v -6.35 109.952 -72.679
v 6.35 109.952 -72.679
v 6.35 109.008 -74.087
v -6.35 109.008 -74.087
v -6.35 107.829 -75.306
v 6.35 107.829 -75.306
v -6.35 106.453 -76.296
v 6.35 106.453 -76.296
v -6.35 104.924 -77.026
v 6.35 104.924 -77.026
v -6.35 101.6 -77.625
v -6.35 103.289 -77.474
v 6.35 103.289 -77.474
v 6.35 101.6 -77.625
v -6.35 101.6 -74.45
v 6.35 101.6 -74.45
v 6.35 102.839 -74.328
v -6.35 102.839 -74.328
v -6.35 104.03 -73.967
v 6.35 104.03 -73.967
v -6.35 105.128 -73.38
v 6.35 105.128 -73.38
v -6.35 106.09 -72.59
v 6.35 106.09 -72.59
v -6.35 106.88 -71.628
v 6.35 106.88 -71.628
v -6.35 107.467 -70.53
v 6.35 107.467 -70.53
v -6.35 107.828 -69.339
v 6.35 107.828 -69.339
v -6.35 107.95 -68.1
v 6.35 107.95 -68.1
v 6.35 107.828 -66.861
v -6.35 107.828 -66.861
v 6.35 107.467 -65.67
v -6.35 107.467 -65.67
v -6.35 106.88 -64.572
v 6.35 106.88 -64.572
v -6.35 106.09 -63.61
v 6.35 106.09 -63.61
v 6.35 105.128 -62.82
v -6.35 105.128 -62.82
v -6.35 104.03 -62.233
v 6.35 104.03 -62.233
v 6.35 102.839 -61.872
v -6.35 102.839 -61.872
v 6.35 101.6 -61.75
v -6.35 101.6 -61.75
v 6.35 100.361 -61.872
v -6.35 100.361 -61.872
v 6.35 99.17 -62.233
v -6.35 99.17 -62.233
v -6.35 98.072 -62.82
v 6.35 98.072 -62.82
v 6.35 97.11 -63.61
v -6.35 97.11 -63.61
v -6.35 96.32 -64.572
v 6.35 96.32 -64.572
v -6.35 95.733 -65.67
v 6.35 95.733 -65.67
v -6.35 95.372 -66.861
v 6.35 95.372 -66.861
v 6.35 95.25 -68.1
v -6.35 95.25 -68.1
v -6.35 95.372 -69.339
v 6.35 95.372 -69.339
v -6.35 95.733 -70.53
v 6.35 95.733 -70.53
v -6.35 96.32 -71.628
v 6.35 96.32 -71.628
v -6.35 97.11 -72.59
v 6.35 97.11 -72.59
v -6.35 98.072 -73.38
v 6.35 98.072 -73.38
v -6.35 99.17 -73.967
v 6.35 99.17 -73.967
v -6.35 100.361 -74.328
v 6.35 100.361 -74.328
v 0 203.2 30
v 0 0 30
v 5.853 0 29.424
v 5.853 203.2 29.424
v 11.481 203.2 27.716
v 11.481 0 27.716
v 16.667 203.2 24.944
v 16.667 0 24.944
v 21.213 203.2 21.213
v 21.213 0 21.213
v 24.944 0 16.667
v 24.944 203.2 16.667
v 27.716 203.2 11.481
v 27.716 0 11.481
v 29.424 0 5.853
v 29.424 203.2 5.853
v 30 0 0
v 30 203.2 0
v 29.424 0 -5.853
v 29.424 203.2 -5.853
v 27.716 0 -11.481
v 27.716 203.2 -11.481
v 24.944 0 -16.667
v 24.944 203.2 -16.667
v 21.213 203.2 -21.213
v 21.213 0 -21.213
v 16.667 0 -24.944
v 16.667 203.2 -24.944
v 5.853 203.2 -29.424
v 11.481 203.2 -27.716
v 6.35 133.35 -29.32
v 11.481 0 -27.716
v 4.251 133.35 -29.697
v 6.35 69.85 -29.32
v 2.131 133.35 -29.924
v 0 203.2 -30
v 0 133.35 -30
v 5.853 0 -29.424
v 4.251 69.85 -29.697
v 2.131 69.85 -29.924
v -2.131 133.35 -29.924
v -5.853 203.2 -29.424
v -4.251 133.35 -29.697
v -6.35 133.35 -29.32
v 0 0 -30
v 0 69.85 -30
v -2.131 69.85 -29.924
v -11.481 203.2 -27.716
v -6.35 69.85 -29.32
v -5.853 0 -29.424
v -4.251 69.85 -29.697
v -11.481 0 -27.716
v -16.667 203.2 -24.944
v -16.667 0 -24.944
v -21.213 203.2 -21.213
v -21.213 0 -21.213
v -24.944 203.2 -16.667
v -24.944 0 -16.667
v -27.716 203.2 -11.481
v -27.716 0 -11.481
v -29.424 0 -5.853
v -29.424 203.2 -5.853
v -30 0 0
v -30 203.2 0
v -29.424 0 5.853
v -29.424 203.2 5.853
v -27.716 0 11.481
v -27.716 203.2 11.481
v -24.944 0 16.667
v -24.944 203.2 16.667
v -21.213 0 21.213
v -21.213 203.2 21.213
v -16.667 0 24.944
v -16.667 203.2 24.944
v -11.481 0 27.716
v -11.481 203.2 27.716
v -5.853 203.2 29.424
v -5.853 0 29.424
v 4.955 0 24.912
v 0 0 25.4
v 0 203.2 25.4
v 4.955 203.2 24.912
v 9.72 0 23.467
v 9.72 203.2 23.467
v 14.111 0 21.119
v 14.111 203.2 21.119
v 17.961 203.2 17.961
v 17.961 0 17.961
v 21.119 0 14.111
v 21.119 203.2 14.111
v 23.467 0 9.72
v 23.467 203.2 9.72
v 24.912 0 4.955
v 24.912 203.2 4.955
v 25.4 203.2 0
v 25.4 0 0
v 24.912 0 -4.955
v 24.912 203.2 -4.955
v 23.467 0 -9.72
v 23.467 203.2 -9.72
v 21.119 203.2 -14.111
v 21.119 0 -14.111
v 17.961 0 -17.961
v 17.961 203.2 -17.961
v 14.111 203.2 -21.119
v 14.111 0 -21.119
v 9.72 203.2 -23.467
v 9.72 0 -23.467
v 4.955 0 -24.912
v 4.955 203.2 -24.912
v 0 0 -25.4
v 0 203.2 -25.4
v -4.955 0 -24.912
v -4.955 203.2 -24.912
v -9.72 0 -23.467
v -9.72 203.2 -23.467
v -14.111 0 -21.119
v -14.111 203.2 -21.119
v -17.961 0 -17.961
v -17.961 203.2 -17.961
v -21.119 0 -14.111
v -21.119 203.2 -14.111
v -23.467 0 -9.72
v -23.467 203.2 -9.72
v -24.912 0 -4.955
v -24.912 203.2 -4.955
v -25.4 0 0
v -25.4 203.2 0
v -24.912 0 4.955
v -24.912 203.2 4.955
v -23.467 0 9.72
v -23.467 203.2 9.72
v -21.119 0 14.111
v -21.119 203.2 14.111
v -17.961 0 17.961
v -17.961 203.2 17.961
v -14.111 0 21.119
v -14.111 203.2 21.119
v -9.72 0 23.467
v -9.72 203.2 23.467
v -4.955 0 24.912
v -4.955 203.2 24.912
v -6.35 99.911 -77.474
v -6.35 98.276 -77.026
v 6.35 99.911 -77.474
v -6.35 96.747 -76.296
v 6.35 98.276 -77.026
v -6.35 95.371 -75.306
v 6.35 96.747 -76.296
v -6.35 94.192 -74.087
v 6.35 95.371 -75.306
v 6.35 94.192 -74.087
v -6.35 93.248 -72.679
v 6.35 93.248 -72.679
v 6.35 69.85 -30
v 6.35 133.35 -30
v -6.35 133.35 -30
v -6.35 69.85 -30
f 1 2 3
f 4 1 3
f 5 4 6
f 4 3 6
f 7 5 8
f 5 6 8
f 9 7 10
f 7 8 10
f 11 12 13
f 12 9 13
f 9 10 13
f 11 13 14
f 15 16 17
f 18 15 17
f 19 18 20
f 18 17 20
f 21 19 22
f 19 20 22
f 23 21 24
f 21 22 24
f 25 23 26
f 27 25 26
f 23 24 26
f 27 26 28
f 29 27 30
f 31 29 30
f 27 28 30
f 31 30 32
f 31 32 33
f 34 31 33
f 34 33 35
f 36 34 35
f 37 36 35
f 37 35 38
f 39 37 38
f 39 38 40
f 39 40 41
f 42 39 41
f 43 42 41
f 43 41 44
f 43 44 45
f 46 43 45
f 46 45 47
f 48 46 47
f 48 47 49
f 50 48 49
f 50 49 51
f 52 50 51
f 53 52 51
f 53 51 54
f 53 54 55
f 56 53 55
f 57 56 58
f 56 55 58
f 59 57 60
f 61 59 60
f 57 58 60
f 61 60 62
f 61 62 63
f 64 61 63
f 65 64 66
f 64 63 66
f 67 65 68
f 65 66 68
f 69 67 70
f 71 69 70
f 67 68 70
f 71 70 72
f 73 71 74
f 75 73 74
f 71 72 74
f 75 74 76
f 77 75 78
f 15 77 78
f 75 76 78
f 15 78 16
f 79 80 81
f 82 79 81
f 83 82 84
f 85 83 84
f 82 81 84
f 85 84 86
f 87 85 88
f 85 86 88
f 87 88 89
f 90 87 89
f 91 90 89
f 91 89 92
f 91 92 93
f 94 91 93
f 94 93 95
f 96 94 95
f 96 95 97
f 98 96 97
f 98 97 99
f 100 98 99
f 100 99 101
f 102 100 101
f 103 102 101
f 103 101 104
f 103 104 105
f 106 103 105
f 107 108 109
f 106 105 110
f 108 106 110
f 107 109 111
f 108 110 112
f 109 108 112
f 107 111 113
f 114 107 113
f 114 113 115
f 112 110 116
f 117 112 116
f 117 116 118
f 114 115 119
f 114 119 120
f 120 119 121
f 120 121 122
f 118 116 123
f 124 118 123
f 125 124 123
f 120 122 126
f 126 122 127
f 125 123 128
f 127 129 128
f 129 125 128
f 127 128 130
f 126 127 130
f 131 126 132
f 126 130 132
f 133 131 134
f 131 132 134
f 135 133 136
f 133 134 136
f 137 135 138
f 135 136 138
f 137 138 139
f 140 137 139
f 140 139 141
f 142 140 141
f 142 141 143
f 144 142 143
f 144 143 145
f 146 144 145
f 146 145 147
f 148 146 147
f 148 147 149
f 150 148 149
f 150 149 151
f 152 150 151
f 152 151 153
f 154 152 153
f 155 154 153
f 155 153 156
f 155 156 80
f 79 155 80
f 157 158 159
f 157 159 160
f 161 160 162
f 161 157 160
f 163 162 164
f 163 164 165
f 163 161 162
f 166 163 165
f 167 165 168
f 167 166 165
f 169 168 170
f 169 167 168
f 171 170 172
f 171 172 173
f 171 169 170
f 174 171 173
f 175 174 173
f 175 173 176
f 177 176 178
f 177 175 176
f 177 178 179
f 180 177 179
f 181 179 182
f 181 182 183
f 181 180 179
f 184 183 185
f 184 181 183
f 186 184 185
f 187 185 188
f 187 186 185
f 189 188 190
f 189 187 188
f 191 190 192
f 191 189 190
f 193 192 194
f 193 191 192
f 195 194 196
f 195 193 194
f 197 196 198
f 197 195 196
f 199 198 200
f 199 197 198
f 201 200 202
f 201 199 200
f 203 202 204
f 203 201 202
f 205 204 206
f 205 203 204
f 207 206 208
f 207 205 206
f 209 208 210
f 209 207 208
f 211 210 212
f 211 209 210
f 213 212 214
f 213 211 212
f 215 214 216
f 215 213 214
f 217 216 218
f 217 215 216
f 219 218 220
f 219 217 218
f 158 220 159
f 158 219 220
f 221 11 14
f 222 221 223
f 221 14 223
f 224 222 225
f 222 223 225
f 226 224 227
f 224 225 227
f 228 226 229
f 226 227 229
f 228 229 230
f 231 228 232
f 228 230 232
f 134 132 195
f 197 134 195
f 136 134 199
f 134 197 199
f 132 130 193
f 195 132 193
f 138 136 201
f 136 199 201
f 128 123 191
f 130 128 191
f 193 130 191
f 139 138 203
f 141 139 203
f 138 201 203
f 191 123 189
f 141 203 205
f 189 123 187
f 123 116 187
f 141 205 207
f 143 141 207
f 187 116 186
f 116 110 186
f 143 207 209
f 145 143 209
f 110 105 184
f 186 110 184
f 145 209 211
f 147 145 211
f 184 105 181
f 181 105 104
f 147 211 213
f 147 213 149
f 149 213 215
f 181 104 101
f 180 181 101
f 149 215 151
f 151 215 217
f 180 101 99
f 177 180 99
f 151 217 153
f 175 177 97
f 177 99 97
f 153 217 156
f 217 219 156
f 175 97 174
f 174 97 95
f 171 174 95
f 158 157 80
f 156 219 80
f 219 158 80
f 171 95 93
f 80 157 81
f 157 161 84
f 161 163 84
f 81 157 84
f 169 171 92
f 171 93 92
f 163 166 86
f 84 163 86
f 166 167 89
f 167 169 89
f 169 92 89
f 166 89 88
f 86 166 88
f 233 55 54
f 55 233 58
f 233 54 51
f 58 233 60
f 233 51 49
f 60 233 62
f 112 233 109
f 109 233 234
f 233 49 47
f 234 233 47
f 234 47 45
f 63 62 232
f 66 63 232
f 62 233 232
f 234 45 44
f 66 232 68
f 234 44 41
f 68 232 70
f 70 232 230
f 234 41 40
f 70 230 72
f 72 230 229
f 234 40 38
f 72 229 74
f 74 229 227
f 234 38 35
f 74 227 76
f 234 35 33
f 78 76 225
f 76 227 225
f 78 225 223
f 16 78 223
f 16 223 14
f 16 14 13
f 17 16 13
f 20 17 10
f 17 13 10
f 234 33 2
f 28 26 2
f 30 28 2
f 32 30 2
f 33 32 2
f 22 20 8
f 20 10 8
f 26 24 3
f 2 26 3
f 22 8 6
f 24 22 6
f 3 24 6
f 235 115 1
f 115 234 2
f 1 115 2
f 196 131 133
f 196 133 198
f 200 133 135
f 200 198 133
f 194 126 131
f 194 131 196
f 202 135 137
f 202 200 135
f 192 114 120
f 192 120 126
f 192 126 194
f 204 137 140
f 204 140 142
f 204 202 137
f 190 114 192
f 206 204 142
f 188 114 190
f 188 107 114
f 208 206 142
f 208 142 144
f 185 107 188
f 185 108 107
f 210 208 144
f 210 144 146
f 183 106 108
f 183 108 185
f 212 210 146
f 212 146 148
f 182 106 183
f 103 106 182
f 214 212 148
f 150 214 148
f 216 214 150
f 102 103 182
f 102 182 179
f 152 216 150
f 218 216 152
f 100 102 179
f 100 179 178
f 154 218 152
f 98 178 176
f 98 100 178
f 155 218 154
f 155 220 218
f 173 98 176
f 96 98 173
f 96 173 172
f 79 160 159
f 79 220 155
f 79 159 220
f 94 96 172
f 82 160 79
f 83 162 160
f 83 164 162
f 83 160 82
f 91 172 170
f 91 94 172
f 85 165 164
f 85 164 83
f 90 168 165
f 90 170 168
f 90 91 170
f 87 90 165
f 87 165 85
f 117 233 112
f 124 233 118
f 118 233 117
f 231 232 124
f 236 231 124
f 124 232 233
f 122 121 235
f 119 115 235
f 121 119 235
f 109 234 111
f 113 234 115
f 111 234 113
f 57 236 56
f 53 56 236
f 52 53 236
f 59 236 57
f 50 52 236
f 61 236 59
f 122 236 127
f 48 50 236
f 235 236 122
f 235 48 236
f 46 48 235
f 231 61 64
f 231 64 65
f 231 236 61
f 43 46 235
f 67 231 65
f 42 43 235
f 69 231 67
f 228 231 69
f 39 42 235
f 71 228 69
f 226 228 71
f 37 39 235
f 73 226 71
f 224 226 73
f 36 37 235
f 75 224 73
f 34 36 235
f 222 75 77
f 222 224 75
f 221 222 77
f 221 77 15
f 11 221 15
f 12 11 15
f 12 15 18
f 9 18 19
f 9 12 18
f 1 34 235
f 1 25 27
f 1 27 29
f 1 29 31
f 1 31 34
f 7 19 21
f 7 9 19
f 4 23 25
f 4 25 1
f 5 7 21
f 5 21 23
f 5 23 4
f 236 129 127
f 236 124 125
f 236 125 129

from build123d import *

# Parameters (mm, degrees)
SKETCH1_R                            = 30
SKETCH1_R_2                          = 25.4
BOSS_EXTRUDE1_DEPTH                  = 203.2
SKETCH2_W                            = 12.7
SKETCH2_H                            = 63.5
BOSS_EXTRUDE2_DEPTH                  = 50.8
BOSS_EXTRUDE2_DIRECTION_2_REACH      = 215.987
BOSS_EXTRUDE2_DIRECTION_2_END_RADIUS = 30
CUT_EXTRUDE3_REACH                   = 223.676
SKETCH3_R                            = 6.35
CUT_EXTRUDE3_DIRECTION_2_DEPTH       = 222.675895171


with BuildPart() as part:
    # Sketch1 → Boss-Extrude1 (new body)
    with BuildSketch(Plane(origin=(0, 0, 0), x_dir=(1, 0, 0), z_dir=(0, 1, 0))):
        with Locations(Location((0, 0, 0), (0, 0, 270))):
            Circle(SKETCH1_R)
        with Locations(Location((0, 0, 0), (0, 0, 270))):
            Circle(SKETCH1_R_2, mode=Mode.SUBTRACT)
    extrude(amount=BOSS_EXTRUDE1_DEPTH)

    # Sketch2 → Boss-Extrude2 (add)
    with BuildSketch(Plane(origin=(0, 0, -30), x_dir=(-1, 0, 0), z_dir=(0, 0, -1))):
        with Locations((0, 101.6)):
            Rectangle(SKETCH2_W, SKETCH2_H)
    extrude(amount=BOSS_EXTRUDE2_DEPTH)

    # Boss-Extrude2 direction 2: up to this cylinder (the profile starts outside it)
    boss_extrude2_direction_2_end = Plane(origin=(0, 101.6, 0), z_dir=(0, -1, 0)) * Cylinder(BOSS_EXTRUDE2_DIRECTION_2_END_RADIUS, 492.974, mode=Mode.PRIVATE)
    # Sketch2 → Boss-Extrude2 direction 2 (add, up to the surface)
    with BuildSketch(Plane(origin=(0, 0, -30), x_dir=(-1, 0, 0), z_dir=(0, 0, -1)), mode=Mode.PRIVATE) as boss_extrude2_direction_2_sk1:
        with Locations((0, 101.6)):
            Rectangle(SKETCH2_W, SKETCH2_H)
    boss_extrude2_direction_2_tool1 = extrude(boss_extrude2_direction_2_sk1.sketch, amount=-BOSS_EXTRUDE2_DIRECTION_2_REACH, mode=Mode.PRIVATE) - boss_extrude2_direction_2_end
    add(boss_extrude2_direction_2_tool1.solids().sort_by_distance((0, 101.6, -30))[0])
    add(boss_extrude2_direction_2_tool1.solids().sort_by_distance((0, 101.6, -30))[1])

    # Sketch3 → Cut-Extrude3 (cut, up to next)
    with BuildSketch(Plane(origin=(6.35, 0, 0), x_dir=(0, 0, -1), z_dir=(1, 0, 0)), mode=Mode.PRIVATE) as cut_extrude3_sk1:
        with BuildLine():
            Line((72.678913322, 93.247804014), (30, 69.85))
            Line((30, 69.85), (80.8, 69.85))
            Line((80.8, 69.85), (80.8, 133.35))
            Line((80.8, 133.35), (30, 133.35))
            Line((30, 133.35), (72.678913322, 109.952195986))
            ThreePointArc((72.678913322, 109.952195986), (76.295723714, 106.453425368), (77.625, 101.6))
            ThreePointArc((77.625, 101.6), (76.295723714, 96.746574632), (72.678913322, 93.247804014))
        make_face()
    cut_extrude3_tool1 = extrude(cut_extrude3_sk1.sketch, amount=-CUT_EXTRUDE3_REACH, mode=Mode.PRIVATE) & part.part
    # Sketch3 → Cut-Extrude3 (cut, up to next)
    with BuildSketch(Plane(origin=(6.35, 0, 0), x_dir=(0, 0, -1), z_dir=(1, 0, 0)), mode=Mode.PRIVATE) as cut_extrude3_sk2:
        with Locations((68.1, 101.6)):
            Circle(SKETCH3_R)
    cut_extrude3_tool2 = extrude(cut_extrude3_sk2.sketch, amount=-CUT_EXTRUDE3_REACH, mode=Mode.PRIVATE) & part.part
    add(cut_extrude3_tool1.solids().sort_by_distance((6.35, 80.835833, -51.730381))[0], mode=Mode.SUBTRACT)
    add(cut_extrude3_tool2.solids().sort_by_distance((6.35, 101.6, -68.1))[0], mode=Mode.SUBTRACT)

    # Sketch3 → Cut-Extrude3 direction 2 (cut)
    with BuildSketch(Plane(origin=(6.35, 0, 0), x_dir=(0, 0, -1), z_dir=(1, 0, 0))):
        with BuildLine():
            Line((72.678913322, 93.247804014), (30, 69.85))
            Line((30, 69.85), (80.8, 69.85))
            Line((80.8, 69.85), (80.8, 133.35))
            Line((80.8, 133.35), (30, 133.35))
            Line((30, 133.35), (72.678913322, 109.952195986))
            ThreePointArc((72.678913322, 109.952195986), (76.295723714, 106.453425368), (77.625, 101.6))
            ThreePointArc((77.625, 101.6), (76.295723714, 96.746574632), (72.678913322, 93.247804014))
        make_face()
        with Locations((68.1, 101.6)):
            Circle(SKETCH3_R)
    extrude(amount=CUT_EXTRUDE3_DIRECTION_2_DEPTH, mode=Mode.SUBTRACT)


solid = part.part
